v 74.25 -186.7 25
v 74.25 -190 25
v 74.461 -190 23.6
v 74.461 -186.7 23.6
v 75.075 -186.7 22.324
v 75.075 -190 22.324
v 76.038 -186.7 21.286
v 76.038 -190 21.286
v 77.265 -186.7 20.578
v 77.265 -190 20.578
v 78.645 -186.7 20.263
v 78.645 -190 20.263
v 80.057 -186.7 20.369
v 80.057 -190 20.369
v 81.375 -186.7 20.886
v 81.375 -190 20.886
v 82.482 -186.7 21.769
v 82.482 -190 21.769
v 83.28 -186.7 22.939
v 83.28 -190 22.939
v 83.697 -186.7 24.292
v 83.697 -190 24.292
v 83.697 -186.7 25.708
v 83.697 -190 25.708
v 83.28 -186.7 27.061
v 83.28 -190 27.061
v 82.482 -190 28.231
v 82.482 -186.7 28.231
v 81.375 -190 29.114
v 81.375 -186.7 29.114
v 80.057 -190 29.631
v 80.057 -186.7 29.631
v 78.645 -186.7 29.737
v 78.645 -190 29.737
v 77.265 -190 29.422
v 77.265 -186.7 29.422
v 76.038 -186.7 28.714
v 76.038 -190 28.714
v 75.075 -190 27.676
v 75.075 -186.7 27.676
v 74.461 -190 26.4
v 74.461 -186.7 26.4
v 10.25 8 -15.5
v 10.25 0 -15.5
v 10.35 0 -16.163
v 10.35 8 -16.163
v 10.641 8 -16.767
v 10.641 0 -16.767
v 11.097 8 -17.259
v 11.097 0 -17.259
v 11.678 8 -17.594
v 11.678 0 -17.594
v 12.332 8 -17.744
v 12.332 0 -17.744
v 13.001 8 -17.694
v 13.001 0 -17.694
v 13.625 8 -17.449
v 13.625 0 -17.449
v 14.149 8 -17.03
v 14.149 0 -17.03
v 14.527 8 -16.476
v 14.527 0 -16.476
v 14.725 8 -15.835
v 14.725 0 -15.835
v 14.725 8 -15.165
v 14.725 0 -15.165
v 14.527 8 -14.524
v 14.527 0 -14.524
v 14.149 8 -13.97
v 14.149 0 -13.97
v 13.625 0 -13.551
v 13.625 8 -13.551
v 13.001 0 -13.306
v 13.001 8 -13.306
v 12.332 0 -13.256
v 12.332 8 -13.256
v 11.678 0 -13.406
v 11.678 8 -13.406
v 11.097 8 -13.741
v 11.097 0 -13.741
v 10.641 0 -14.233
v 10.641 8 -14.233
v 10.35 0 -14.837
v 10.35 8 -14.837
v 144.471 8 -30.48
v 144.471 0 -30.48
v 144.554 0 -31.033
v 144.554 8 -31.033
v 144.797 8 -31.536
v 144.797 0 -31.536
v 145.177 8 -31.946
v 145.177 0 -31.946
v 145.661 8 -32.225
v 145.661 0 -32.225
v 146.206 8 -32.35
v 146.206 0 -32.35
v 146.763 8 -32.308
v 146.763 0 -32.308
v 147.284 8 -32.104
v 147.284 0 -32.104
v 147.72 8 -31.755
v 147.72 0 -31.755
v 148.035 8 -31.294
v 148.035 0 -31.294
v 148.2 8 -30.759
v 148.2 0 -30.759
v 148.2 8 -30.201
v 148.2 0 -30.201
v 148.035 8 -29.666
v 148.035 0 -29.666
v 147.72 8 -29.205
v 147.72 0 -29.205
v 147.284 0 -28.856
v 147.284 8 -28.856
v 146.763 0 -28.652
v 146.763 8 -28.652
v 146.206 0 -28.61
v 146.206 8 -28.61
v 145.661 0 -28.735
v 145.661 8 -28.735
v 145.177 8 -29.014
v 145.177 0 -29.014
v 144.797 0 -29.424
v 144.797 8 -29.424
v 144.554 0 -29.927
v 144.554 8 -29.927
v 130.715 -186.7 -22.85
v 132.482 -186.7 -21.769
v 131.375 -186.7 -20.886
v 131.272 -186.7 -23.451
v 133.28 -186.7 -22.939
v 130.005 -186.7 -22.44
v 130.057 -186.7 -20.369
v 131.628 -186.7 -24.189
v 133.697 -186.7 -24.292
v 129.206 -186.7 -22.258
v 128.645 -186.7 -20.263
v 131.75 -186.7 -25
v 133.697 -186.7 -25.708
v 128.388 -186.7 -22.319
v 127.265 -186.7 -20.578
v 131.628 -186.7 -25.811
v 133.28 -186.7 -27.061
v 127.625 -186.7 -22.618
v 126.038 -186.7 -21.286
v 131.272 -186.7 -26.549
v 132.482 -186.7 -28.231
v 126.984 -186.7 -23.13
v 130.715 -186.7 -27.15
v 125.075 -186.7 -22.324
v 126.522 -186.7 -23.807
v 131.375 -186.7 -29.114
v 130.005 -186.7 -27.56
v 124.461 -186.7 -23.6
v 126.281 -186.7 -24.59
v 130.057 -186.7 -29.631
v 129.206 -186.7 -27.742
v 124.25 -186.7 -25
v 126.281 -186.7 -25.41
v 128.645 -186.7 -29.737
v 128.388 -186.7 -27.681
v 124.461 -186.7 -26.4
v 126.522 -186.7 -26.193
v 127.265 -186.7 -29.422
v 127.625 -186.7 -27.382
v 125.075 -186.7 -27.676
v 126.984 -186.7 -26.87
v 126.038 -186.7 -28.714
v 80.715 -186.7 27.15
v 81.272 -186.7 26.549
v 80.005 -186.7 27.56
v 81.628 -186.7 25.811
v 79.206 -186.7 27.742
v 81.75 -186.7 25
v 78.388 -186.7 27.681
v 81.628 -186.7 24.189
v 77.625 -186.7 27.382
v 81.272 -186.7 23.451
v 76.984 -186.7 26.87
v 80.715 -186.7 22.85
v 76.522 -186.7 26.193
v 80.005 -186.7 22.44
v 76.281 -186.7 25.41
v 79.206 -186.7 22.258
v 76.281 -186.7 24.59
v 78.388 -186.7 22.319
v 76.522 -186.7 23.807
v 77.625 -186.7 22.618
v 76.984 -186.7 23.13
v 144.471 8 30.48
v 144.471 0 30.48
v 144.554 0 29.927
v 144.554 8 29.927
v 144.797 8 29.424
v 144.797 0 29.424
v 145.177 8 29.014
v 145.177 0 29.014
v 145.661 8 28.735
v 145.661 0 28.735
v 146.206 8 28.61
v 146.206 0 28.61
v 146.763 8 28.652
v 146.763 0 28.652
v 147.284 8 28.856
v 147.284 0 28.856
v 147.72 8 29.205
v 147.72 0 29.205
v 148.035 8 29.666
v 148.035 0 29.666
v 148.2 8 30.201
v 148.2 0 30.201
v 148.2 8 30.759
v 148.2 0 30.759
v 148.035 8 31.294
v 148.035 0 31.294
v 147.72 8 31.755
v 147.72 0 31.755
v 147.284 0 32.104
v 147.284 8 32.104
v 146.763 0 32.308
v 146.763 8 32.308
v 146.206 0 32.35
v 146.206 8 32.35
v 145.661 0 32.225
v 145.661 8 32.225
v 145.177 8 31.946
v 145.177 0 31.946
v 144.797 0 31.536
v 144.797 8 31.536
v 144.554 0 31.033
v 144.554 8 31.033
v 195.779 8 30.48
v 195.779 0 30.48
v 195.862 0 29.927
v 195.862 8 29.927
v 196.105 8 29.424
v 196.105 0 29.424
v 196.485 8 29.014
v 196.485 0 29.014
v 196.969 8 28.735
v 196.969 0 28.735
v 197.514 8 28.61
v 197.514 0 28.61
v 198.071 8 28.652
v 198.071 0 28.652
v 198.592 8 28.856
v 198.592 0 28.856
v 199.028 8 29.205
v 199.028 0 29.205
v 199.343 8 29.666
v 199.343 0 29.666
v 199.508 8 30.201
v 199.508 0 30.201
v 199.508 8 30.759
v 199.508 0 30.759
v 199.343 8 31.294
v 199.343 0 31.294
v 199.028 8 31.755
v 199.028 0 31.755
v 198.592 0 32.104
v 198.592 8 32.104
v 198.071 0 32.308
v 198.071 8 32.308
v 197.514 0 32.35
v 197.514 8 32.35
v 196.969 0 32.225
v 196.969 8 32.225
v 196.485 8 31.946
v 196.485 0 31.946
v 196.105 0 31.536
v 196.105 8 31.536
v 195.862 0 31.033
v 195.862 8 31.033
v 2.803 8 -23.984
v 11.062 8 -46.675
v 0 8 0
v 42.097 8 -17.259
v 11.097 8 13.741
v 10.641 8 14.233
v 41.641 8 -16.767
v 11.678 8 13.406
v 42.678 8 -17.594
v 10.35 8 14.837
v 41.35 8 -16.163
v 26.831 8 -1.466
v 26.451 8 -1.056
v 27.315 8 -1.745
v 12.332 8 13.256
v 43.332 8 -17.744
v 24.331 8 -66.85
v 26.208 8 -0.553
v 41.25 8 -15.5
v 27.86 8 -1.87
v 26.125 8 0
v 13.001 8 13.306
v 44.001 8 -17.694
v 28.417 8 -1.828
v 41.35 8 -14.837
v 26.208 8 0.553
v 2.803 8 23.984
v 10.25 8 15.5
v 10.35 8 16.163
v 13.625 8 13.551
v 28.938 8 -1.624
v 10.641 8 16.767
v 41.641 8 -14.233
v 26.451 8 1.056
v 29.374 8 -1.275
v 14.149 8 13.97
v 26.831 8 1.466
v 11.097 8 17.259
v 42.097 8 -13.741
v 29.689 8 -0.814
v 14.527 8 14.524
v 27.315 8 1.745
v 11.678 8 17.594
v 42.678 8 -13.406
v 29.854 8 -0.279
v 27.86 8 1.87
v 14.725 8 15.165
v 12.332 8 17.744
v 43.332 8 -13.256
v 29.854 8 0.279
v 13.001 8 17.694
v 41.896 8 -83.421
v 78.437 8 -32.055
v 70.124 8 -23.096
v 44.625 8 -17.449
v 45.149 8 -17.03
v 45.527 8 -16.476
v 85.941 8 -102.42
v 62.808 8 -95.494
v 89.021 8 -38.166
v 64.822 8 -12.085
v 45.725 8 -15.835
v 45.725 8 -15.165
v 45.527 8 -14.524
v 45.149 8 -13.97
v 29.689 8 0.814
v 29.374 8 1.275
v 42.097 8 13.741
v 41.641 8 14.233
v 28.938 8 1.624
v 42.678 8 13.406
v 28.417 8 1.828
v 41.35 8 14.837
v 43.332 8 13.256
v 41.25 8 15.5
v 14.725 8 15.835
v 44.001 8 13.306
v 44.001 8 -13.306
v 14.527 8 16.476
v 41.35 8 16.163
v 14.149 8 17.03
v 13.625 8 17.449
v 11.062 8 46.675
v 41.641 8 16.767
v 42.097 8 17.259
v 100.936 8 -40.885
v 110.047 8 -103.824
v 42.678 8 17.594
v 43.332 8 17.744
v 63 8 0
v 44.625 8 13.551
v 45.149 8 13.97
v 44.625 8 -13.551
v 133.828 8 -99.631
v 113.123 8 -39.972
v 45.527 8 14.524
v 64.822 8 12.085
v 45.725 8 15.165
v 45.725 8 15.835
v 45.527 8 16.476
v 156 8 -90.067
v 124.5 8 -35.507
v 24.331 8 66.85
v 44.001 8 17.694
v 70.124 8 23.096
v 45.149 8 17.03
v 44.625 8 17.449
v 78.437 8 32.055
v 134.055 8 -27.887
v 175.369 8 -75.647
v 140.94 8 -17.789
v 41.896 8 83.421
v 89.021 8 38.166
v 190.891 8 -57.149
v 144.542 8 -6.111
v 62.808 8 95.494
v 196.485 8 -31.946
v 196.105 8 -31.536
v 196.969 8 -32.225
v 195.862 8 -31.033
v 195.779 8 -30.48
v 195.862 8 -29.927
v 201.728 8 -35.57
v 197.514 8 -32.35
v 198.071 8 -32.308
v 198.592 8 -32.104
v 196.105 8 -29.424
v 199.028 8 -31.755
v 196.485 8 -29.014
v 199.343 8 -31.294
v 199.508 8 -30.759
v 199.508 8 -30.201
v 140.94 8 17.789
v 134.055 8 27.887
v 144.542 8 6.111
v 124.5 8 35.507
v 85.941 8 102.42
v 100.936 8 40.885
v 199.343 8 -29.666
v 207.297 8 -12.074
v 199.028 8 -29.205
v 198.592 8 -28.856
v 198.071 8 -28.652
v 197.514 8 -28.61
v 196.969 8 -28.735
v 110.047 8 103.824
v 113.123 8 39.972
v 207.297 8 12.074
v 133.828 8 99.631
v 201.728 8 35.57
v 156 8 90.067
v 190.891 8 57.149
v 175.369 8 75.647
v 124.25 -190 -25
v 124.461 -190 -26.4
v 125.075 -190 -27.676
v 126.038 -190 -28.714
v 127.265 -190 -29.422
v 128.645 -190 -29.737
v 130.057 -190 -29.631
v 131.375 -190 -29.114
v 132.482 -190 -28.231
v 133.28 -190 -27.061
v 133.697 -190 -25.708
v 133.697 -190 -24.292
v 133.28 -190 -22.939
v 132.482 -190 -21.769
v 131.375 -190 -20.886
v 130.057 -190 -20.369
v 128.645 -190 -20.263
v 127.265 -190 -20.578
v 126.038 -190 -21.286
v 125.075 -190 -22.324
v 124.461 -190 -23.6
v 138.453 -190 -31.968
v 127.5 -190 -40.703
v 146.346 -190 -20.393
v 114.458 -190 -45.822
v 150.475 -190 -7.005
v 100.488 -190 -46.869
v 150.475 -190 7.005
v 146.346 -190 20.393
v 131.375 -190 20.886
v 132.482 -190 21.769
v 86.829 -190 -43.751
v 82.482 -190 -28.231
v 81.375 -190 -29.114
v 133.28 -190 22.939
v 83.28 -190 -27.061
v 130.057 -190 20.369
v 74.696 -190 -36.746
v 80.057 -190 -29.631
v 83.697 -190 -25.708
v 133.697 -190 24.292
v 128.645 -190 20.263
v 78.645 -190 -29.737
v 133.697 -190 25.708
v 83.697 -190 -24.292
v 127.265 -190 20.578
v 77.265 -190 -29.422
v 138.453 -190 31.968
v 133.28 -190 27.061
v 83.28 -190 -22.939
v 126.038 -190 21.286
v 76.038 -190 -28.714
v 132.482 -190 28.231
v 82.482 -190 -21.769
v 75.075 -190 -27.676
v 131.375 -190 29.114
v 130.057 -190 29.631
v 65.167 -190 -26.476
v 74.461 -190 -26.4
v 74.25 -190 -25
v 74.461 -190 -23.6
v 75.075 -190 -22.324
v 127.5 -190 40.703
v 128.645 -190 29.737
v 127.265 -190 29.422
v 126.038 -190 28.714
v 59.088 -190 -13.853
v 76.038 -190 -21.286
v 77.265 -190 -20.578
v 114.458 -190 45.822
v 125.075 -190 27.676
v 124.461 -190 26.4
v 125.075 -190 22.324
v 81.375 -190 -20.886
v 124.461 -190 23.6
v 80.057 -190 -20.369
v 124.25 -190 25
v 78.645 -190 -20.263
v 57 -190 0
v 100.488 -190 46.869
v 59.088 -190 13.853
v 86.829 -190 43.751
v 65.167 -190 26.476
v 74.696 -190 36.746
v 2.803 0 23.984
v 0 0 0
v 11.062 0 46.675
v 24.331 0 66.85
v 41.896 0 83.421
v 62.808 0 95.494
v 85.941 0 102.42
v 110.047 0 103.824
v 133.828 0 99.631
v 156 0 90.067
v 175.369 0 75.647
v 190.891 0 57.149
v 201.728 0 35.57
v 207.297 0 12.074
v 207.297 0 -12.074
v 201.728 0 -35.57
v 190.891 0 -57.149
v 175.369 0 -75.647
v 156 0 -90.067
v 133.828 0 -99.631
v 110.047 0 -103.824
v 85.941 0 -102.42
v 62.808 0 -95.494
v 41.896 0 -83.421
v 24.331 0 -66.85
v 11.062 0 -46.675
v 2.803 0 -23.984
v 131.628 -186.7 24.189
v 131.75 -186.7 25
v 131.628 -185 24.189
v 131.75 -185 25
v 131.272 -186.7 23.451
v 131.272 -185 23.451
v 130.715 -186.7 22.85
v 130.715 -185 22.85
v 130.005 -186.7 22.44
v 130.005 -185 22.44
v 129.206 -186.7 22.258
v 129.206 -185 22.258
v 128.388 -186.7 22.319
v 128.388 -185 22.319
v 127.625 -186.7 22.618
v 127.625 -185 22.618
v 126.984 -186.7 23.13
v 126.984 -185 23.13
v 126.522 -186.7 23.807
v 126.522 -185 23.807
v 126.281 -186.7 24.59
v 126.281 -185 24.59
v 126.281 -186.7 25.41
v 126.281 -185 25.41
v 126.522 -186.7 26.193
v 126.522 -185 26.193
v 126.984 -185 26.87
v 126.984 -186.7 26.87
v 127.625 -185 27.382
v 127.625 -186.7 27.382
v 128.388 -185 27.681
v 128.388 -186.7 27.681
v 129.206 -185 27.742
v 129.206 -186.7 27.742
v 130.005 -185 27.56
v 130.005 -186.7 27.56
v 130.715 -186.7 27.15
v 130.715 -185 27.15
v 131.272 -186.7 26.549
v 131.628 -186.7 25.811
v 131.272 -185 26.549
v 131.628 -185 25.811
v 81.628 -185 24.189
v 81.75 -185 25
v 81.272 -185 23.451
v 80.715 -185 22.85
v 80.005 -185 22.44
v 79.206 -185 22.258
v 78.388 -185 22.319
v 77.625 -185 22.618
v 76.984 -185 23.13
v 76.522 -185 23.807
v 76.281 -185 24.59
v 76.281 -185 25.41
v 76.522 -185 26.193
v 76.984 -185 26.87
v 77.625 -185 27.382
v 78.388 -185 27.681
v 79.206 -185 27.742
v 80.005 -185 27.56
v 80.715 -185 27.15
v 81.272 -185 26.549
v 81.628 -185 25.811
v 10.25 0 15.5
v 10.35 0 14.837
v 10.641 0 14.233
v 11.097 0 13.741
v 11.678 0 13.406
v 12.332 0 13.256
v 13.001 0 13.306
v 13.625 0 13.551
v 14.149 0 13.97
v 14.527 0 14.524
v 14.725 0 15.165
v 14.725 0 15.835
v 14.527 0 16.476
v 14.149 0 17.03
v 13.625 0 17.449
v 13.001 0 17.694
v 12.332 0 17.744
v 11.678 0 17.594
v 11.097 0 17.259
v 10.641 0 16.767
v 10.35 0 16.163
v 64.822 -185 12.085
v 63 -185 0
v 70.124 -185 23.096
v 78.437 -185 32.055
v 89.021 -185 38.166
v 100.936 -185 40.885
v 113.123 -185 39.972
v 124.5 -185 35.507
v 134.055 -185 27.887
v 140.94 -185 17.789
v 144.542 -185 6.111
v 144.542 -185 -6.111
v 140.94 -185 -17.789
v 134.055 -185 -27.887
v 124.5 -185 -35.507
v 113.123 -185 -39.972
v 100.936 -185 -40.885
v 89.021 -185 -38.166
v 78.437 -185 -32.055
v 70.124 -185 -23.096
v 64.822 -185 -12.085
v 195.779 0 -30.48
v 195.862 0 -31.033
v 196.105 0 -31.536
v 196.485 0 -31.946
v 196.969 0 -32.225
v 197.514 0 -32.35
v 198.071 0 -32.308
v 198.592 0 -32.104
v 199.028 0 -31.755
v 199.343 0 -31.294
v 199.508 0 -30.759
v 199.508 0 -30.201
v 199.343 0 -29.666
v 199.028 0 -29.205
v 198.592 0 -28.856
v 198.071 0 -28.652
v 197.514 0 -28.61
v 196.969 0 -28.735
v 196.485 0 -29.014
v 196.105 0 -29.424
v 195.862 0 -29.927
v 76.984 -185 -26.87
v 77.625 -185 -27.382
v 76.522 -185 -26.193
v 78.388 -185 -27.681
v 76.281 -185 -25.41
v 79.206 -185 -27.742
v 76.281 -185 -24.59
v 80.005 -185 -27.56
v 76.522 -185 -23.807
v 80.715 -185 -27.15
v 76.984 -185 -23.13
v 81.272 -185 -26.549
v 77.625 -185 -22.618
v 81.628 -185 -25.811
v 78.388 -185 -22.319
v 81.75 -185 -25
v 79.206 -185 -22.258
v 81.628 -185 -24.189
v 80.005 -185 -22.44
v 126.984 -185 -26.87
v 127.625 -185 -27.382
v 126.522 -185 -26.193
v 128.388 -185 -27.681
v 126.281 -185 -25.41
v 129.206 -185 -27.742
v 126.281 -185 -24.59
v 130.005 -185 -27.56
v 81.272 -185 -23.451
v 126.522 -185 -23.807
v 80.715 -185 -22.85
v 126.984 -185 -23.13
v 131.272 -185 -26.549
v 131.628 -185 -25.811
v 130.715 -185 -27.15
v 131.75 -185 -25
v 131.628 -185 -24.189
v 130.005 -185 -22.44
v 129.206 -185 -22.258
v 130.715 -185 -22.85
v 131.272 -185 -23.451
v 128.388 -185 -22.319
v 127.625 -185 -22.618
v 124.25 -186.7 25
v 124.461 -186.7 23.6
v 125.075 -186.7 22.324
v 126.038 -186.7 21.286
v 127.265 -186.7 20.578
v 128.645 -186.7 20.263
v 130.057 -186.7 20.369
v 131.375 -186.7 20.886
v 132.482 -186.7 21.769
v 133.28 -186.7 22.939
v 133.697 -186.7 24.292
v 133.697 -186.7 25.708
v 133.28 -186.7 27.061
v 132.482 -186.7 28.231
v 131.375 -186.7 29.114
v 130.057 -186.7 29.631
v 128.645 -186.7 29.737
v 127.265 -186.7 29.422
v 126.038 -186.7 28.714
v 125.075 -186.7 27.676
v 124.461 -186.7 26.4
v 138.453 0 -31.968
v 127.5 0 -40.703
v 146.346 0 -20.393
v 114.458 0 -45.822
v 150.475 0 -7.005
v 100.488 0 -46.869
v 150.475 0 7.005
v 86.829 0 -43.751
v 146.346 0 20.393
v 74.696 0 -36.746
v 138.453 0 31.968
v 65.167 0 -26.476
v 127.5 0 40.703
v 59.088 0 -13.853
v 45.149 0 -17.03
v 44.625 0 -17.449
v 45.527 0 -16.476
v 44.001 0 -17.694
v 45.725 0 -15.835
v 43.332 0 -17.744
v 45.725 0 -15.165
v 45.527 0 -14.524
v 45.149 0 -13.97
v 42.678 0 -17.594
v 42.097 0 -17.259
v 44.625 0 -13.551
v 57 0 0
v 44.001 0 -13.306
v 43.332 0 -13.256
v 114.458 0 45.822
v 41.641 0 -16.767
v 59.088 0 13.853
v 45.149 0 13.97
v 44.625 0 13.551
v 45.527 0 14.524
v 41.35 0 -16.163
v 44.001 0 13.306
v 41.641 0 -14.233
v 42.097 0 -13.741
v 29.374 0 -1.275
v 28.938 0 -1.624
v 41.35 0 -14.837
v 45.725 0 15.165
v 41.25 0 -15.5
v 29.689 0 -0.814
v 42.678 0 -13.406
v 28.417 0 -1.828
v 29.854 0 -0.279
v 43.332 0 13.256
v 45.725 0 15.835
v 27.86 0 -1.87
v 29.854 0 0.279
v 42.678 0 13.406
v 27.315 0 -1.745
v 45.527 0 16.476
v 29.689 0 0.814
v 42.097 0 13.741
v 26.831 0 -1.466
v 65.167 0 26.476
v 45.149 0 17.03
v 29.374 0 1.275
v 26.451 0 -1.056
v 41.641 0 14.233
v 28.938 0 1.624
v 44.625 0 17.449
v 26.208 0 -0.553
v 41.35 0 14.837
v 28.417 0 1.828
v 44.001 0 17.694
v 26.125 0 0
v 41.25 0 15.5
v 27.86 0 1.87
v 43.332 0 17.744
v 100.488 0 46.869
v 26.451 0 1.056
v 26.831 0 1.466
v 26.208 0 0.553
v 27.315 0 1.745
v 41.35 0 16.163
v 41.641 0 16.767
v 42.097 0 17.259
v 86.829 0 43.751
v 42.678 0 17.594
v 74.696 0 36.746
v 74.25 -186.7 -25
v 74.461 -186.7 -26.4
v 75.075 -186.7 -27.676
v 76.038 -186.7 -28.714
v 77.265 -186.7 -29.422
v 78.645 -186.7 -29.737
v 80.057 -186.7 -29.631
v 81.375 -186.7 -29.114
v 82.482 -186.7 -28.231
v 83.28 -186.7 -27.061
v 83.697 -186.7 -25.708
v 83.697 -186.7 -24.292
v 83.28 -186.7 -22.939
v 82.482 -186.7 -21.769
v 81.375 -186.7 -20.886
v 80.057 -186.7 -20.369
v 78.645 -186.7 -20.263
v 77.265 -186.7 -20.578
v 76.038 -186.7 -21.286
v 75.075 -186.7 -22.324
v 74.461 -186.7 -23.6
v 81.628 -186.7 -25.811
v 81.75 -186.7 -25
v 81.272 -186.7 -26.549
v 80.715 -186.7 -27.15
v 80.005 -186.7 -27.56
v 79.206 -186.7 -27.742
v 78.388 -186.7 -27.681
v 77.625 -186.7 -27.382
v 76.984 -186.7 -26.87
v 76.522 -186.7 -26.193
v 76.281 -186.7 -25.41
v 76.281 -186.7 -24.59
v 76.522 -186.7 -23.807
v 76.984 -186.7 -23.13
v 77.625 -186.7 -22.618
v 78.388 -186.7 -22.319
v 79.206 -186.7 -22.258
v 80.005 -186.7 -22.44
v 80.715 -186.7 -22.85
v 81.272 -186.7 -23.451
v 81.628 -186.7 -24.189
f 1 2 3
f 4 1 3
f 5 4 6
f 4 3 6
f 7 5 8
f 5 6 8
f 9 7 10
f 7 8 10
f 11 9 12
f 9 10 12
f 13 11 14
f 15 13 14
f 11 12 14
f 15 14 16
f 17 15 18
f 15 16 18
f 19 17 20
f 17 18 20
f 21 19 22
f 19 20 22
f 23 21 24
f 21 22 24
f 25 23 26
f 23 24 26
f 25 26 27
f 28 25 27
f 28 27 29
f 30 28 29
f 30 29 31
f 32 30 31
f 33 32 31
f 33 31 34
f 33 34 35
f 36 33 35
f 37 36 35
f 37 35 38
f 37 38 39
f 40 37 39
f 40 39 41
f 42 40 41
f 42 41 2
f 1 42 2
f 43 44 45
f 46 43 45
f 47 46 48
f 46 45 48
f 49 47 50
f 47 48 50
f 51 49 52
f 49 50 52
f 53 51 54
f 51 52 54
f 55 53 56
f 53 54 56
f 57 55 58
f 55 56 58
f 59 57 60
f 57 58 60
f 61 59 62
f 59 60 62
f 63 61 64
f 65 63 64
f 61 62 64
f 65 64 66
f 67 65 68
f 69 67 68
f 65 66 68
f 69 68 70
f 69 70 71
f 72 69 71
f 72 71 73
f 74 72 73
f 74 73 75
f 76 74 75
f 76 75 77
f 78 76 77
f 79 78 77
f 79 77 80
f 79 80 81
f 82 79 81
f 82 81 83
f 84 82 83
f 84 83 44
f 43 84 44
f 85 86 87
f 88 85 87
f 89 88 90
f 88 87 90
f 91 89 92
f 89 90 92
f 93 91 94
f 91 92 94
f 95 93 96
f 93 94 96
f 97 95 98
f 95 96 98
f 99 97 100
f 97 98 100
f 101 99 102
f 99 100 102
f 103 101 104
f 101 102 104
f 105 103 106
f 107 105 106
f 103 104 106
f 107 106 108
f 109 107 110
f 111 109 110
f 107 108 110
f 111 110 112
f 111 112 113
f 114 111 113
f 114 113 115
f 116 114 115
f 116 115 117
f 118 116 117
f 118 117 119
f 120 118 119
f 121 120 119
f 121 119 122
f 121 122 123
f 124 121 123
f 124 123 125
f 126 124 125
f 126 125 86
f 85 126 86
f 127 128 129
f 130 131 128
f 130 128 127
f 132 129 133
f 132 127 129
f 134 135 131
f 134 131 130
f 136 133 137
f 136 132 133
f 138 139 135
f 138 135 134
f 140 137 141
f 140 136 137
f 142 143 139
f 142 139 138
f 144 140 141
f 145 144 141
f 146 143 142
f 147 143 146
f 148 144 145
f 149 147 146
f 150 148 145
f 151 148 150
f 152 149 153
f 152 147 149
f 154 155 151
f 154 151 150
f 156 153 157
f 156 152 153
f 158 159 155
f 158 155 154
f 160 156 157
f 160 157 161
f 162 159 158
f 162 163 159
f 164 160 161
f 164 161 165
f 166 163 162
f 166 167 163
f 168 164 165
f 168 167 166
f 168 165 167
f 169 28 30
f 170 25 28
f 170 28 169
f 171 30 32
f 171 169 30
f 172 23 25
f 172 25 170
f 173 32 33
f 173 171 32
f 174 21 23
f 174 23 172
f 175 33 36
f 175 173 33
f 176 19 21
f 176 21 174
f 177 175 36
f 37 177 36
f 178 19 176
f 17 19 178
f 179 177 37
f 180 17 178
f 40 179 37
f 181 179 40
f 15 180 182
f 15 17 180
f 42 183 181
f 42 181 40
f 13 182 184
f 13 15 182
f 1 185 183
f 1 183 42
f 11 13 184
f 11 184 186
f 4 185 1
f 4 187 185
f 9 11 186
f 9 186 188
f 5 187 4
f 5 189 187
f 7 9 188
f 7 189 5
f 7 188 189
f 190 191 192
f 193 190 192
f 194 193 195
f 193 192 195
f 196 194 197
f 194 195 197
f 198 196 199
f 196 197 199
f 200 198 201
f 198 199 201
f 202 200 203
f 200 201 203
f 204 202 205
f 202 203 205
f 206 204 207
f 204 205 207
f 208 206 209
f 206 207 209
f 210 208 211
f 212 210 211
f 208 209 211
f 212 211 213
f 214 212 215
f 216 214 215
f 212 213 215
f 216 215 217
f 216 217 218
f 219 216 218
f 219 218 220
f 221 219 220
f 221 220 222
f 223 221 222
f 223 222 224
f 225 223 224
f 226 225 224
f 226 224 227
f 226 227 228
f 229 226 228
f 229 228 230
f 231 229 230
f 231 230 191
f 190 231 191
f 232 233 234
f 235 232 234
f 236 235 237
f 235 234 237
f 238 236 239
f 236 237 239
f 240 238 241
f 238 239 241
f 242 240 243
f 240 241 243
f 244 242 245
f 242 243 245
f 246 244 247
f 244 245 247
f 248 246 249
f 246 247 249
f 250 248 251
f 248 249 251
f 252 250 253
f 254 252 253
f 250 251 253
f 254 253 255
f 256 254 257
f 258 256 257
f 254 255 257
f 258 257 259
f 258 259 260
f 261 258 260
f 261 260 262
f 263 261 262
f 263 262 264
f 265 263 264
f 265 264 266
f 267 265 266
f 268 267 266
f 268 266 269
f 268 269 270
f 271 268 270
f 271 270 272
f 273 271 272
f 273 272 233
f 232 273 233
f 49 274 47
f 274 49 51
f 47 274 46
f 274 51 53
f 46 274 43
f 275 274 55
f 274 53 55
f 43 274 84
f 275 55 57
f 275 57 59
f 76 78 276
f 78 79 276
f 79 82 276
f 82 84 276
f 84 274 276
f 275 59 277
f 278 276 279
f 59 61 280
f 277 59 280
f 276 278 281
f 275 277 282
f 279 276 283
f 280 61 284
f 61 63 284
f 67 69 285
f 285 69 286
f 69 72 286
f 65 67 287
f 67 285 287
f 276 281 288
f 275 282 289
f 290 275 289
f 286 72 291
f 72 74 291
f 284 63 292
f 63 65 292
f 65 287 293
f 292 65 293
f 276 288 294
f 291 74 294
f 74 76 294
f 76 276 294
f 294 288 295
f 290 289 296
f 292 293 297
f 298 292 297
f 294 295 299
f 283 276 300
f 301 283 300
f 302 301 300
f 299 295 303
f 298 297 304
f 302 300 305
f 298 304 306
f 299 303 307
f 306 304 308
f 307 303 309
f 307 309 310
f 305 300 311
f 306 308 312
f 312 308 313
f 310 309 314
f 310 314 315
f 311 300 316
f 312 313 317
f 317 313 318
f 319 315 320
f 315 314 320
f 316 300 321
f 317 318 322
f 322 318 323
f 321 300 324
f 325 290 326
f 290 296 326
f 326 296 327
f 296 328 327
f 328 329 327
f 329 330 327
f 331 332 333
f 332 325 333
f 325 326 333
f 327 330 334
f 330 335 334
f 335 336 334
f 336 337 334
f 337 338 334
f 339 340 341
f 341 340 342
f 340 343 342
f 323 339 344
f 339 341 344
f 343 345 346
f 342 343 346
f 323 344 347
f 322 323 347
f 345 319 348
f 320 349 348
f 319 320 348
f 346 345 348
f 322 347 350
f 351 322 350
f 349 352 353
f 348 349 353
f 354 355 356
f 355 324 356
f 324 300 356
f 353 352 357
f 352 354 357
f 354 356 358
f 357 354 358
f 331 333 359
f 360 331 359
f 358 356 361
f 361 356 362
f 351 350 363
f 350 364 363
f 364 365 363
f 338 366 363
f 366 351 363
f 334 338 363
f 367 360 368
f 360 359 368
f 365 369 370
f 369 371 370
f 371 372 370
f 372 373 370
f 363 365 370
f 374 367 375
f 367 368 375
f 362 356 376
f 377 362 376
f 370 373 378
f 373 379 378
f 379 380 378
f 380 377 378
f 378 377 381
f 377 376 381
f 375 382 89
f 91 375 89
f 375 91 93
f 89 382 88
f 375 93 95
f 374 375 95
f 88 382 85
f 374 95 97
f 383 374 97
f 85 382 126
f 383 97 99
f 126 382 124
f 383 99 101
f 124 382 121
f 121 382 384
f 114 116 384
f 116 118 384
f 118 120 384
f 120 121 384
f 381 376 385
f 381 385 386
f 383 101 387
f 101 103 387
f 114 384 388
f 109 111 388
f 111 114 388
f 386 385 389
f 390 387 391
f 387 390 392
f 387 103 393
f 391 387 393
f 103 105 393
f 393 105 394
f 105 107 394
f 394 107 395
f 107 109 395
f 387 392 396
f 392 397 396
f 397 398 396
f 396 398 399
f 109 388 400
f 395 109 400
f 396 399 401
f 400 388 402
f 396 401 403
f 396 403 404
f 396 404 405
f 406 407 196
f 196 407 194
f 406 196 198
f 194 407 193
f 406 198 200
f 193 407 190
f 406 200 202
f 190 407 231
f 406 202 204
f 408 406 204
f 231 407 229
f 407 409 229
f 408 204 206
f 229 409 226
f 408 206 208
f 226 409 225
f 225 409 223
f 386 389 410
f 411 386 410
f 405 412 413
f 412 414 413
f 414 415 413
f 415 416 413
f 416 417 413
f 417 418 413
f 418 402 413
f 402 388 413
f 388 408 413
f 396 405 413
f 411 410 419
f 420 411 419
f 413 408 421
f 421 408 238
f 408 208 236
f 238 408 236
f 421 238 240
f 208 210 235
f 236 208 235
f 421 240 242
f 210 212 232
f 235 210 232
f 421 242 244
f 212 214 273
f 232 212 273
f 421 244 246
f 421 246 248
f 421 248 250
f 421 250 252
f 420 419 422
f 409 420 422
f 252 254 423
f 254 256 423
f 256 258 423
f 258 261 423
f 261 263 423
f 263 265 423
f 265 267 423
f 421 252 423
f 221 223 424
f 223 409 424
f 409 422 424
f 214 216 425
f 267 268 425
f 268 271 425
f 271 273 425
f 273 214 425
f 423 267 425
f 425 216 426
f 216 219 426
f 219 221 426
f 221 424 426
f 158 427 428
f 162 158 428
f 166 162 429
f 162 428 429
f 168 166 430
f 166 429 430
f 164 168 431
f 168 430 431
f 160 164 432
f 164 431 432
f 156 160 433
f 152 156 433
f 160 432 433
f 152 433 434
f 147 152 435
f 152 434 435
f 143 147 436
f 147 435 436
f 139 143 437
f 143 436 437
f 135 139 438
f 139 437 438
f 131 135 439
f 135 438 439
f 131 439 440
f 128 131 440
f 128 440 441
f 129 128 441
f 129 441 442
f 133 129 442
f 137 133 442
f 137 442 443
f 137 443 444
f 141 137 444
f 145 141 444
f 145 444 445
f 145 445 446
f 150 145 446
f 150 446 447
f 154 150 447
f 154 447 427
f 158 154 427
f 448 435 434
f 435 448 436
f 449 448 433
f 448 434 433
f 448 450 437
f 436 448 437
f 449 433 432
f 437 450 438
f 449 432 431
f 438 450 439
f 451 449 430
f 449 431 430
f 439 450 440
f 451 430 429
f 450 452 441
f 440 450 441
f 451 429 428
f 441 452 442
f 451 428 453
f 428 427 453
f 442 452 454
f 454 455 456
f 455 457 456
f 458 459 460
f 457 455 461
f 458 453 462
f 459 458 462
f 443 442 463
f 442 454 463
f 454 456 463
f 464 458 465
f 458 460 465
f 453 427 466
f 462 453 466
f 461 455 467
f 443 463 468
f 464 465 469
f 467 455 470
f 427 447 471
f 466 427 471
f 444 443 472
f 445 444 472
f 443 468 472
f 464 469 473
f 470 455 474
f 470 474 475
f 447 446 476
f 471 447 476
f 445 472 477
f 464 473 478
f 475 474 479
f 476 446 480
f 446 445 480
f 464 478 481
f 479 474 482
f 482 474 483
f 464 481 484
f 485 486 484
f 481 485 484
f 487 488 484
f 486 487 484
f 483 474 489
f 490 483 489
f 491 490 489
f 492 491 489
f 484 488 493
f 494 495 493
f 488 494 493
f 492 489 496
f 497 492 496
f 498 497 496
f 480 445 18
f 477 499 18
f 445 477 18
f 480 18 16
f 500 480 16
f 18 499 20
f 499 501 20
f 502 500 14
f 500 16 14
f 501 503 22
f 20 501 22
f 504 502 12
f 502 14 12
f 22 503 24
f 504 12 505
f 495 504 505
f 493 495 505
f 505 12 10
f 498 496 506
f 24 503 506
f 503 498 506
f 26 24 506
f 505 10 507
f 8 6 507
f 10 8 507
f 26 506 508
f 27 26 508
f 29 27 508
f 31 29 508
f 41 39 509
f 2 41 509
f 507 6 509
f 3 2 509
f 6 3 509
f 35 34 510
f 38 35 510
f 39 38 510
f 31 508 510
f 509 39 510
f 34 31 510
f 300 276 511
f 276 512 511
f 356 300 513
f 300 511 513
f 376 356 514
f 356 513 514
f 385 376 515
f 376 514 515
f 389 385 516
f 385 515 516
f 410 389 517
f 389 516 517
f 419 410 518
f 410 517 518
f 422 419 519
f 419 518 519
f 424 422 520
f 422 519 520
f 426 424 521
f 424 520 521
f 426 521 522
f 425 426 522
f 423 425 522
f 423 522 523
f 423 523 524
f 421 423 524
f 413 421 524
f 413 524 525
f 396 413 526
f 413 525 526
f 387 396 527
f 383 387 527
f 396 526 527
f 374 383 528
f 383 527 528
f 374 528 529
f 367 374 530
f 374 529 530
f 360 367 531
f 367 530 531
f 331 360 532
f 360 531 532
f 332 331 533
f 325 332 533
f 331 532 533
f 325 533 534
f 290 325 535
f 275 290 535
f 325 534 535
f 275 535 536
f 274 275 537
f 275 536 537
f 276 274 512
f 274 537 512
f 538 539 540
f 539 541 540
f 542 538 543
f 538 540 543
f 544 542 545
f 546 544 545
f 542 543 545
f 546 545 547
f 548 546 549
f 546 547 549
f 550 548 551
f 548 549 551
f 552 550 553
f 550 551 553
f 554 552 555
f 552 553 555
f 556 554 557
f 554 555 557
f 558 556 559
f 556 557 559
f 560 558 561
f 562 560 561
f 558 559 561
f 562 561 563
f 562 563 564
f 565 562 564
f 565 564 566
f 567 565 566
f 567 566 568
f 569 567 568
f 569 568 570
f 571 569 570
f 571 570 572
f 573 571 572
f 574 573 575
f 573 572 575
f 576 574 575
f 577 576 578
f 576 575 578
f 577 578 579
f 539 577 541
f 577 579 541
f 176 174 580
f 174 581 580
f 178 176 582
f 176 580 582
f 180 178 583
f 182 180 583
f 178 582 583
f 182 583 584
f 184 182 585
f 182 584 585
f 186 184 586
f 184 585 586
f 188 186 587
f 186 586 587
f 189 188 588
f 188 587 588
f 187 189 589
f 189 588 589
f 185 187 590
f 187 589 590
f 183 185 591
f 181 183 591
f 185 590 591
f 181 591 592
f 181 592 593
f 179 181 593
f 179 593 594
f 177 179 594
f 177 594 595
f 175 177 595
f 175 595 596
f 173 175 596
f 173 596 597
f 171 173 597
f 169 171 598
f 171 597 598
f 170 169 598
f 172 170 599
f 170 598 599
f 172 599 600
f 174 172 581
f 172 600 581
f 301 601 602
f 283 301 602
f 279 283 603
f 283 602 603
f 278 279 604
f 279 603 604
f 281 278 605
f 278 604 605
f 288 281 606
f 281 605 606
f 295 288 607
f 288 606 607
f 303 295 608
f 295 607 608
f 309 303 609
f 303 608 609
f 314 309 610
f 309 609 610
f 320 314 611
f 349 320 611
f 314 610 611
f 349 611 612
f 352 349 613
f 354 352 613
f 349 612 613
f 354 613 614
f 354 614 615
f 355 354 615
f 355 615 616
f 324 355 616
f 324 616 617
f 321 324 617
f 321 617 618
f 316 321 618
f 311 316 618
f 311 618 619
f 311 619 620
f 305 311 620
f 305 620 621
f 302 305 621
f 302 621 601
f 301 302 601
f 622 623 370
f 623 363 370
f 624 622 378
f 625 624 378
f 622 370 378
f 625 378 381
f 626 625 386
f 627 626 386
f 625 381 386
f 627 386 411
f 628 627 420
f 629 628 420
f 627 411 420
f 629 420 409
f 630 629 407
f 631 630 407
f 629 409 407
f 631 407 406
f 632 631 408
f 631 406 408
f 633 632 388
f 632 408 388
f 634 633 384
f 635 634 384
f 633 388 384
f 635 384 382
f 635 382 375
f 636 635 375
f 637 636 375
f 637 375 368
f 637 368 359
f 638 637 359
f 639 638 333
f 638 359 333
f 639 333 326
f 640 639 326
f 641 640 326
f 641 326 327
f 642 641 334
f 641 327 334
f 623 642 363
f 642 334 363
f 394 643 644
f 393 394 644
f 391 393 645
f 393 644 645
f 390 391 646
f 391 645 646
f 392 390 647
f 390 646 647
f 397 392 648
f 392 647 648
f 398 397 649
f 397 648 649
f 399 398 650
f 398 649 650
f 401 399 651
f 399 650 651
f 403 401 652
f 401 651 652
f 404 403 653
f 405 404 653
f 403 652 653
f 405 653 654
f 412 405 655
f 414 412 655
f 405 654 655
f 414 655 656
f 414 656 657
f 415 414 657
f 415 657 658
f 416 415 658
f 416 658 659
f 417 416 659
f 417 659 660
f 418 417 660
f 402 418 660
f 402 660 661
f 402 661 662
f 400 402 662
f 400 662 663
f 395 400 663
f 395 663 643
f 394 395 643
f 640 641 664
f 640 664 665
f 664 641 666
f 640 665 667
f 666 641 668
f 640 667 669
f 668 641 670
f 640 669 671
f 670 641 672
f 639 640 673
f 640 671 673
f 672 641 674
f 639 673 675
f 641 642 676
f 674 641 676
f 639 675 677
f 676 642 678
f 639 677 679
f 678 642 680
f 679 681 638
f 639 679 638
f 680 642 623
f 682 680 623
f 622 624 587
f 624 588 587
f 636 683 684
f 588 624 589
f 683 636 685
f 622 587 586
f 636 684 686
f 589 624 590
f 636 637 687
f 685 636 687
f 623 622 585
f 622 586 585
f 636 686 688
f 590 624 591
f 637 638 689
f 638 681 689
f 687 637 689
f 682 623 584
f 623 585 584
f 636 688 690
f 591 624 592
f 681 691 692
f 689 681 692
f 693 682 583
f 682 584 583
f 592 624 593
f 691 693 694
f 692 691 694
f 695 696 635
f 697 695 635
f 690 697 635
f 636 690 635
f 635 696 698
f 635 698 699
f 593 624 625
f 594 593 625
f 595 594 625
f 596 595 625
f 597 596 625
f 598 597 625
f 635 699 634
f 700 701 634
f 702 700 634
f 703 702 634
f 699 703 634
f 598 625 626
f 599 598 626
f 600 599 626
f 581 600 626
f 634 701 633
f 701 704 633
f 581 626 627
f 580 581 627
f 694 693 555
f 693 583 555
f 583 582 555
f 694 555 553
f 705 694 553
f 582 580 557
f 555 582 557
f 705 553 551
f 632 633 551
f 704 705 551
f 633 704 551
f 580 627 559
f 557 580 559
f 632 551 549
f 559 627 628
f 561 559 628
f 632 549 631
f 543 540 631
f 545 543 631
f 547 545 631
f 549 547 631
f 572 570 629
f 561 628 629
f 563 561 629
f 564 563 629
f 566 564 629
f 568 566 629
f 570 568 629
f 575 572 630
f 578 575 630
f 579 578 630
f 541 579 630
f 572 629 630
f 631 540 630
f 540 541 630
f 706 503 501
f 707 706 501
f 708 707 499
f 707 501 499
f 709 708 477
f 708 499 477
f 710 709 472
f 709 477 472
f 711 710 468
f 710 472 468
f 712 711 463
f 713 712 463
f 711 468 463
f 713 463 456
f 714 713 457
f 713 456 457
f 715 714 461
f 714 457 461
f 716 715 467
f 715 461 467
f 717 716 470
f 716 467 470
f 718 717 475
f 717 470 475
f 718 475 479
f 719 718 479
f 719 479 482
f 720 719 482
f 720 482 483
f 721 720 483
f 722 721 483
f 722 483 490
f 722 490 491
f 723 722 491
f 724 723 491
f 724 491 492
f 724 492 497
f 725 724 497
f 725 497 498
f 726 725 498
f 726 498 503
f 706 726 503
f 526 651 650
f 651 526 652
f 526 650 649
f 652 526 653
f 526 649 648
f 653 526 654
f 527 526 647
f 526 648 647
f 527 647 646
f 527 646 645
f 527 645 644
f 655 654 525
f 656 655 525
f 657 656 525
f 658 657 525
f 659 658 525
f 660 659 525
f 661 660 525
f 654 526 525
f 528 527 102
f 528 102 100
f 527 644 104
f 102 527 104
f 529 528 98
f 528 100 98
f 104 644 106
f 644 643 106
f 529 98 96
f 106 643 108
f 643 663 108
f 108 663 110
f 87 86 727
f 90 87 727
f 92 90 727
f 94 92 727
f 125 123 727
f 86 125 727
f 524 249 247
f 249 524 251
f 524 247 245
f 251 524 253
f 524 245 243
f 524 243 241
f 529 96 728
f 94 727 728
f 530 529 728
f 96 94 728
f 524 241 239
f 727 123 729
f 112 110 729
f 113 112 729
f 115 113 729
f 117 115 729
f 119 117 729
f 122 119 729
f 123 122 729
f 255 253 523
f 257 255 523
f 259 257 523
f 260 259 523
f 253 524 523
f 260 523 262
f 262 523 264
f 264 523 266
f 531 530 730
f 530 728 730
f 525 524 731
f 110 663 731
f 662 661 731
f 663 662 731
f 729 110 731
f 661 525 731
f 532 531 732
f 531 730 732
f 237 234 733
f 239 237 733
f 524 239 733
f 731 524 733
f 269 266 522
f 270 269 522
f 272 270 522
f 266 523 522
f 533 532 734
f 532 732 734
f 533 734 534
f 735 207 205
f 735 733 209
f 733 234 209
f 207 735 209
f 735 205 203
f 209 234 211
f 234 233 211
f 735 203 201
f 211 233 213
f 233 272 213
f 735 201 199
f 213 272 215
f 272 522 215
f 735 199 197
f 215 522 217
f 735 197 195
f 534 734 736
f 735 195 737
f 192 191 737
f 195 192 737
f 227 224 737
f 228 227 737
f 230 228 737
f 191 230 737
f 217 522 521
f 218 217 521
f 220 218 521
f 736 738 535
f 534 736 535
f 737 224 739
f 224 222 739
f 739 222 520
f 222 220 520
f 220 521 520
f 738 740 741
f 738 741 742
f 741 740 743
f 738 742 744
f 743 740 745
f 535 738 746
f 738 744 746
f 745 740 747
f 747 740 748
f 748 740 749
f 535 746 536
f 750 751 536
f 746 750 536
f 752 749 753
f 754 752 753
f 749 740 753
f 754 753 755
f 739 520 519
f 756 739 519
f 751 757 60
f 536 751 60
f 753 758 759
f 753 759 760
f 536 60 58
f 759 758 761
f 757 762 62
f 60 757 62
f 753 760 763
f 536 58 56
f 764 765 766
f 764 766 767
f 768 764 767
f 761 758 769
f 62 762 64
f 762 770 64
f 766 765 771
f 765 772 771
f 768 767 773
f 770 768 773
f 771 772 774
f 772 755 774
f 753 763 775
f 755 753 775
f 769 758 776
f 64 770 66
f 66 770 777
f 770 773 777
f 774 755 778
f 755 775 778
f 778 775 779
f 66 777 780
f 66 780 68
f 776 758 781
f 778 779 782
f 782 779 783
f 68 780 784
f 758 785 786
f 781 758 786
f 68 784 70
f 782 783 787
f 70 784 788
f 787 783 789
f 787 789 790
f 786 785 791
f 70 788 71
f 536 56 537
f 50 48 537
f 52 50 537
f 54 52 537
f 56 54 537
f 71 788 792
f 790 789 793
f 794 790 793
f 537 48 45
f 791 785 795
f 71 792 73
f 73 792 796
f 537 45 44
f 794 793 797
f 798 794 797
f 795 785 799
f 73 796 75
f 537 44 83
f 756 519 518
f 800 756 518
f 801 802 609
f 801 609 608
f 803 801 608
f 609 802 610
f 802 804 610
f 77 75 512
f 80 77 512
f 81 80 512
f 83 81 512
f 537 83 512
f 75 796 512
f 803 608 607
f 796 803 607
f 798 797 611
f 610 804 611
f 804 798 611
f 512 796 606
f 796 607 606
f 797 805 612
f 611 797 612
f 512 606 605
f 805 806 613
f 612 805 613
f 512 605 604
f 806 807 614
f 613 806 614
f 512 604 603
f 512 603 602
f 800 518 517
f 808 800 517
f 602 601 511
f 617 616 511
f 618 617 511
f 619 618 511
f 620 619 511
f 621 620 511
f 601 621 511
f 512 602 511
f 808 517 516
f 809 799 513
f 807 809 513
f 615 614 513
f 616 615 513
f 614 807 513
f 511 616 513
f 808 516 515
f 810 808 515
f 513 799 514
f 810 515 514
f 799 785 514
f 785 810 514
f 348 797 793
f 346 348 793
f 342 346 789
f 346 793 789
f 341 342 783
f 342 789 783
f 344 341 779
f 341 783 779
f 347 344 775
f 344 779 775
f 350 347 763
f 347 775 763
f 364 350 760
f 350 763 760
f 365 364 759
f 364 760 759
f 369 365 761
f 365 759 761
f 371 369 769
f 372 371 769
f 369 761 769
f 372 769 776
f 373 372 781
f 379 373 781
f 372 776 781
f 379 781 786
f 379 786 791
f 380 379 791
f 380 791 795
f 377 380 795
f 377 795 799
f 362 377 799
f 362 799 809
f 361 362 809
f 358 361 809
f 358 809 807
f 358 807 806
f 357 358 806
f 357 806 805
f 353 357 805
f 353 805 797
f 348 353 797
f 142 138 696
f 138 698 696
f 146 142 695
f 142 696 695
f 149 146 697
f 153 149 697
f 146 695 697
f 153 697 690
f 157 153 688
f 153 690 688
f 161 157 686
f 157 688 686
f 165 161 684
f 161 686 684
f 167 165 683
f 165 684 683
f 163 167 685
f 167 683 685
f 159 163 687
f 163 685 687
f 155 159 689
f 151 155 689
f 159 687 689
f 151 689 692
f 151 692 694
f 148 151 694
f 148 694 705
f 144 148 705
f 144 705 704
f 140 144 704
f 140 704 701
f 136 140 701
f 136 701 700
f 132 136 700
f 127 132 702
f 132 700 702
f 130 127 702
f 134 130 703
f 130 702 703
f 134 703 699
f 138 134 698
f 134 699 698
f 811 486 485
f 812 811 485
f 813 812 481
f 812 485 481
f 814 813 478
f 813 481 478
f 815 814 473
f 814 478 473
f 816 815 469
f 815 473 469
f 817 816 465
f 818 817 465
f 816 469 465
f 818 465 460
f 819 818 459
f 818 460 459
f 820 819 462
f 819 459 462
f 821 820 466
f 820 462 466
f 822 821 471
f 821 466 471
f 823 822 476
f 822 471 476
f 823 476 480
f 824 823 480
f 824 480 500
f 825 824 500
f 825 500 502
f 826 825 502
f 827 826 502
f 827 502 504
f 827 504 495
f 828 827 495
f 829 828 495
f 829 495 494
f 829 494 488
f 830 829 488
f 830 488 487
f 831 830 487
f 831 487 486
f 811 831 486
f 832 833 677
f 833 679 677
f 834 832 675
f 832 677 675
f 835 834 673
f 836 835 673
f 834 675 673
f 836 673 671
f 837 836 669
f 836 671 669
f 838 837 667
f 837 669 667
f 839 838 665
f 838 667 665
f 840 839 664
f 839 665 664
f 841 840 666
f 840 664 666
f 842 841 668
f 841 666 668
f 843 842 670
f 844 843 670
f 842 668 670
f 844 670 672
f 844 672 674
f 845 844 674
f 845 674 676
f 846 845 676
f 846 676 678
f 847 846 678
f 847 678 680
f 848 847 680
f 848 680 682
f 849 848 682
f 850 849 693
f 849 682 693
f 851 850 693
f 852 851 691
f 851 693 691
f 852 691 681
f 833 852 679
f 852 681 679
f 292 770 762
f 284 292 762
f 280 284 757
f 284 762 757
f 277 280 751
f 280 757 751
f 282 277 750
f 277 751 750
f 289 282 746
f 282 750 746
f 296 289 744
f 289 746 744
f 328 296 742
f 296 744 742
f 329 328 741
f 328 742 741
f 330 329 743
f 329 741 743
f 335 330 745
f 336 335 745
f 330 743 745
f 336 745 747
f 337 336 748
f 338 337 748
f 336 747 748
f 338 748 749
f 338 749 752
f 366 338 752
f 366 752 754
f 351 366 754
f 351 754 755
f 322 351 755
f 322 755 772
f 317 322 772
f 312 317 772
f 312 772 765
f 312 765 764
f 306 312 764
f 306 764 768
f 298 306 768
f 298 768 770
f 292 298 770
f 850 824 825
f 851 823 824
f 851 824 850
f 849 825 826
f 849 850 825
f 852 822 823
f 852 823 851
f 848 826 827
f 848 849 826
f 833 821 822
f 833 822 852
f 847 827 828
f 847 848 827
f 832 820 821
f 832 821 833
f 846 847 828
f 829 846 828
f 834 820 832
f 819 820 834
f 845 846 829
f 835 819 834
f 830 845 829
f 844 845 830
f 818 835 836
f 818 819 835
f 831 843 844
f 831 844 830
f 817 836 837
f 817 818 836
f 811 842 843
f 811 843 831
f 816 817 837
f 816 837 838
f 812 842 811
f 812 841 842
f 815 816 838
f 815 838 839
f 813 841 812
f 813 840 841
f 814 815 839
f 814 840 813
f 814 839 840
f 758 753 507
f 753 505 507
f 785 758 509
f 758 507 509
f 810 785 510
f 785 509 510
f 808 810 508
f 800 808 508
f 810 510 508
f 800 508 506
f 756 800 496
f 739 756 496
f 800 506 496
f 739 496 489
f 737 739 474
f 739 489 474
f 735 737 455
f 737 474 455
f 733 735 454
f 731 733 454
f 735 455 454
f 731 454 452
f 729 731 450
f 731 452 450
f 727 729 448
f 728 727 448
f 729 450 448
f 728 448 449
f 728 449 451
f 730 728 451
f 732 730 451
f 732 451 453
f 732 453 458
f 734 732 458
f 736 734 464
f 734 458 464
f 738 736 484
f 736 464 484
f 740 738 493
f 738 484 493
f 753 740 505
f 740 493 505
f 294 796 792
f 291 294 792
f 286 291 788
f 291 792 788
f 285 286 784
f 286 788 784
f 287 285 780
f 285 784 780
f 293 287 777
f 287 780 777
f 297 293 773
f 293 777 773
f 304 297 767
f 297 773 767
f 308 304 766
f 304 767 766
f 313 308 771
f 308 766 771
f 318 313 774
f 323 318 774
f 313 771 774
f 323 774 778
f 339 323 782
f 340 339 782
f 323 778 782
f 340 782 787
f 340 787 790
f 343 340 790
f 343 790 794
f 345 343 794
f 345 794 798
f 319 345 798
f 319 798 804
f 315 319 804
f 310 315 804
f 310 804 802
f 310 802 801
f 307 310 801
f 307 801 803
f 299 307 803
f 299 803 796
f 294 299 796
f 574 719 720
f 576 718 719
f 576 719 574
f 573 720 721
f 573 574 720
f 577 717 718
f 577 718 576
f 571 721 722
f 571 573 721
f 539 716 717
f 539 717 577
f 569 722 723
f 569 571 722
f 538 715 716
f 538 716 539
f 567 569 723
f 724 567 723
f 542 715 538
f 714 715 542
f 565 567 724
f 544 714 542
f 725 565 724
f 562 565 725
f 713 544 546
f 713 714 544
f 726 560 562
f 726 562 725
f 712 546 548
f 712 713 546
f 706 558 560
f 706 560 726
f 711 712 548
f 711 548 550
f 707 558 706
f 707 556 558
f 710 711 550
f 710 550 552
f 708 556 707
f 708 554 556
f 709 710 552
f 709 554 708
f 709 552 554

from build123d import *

# Parameters (mm, degrees)
F_10_24_TAPPED_HOLE3_D                      = 3.75000012
F_10_24_TAPPED_HOLE4_D                      = 3.75000012
F_10_24_TAPPED_HOLE5_D                      = 4.499991
CBORE_FOR_M5_CHEESE_HEAD_SCREW1_D           = 5.5
CBORE_FOR_M5_CHEESE_HEAD_SCREW1_CBORE_D     = 9.5
CBORE_FOR_M5_CHEESE_HEAD_SCREW1_CBORE_DEPTH = 3.3


with BuildPart() as part:
    # Sketch1 → Revolve1 (revolve)
    with BuildSketch(Plane.XY):
        Polygon((0, 0), (57, 0), (57, -190), (104, -190), (104, -185), (63, -185), (63, 8), (0, 8), align=None)
    revolve(axis=Axis((104, -190, 0), (0, 1, 0)))

    # #10-24 Tapped Hole3 (through all)
    with Locations(Plane(origin=(0, 8, 0), x_dir=(1, 0, 0), z_dir=(0, 1, 0))):
        with Locations((146.346, 30.48), (197.654, 30.48), (197.654, -30.48), (146.346, -30.48)):
            Hole(F_10_24_TAPPED_HOLE3_D / 2)

    # #10-24 Tapped Hole4 (through all)
    with Locations(Plane(origin=(0, 8, 0), x_dir=(1, 0, 0), z_dir=(0, 1, 0))):
        with Locations((28, 0)):
            Hole(F_10_24_TAPPED_HOLE4_D / 2)

    # #10-24 Tapped Hole5 (through all)
    with Locations(Plane(origin=(0, 8, 0), x_dir=(1, 0, 0), z_dir=(0, 1, 0))):
        with Locations((12.5, 15.5), (43.5, 15.5), (43.5, -15.5), (12.5, -15.5)):
            Hole(F_10_24_TAPPED_HOLE5_D / 2)

    # CBORE for M5 Cheese Head Screw1 (through all)
    with Locations(Plane(origin=(0, -190, 0), x_dir=(-1, 0, 0), z_dir=(0, -1, 0))):
        with Locations((-79, -25), (-79, 25), (-129, 25), (-129, -25)):
            CounterBoreHole(CBORE_FOR_M5_CHEESE_HEAD_SCREW1_D / 2, CBORE_FOR_M5_CHEESE_HEAD_SCREW1_CBORE_D / 2, CBORE_FOR_M5_CHEESE_HEAD_SCREW1_CBORE_DEPTH)


solid = part.part
